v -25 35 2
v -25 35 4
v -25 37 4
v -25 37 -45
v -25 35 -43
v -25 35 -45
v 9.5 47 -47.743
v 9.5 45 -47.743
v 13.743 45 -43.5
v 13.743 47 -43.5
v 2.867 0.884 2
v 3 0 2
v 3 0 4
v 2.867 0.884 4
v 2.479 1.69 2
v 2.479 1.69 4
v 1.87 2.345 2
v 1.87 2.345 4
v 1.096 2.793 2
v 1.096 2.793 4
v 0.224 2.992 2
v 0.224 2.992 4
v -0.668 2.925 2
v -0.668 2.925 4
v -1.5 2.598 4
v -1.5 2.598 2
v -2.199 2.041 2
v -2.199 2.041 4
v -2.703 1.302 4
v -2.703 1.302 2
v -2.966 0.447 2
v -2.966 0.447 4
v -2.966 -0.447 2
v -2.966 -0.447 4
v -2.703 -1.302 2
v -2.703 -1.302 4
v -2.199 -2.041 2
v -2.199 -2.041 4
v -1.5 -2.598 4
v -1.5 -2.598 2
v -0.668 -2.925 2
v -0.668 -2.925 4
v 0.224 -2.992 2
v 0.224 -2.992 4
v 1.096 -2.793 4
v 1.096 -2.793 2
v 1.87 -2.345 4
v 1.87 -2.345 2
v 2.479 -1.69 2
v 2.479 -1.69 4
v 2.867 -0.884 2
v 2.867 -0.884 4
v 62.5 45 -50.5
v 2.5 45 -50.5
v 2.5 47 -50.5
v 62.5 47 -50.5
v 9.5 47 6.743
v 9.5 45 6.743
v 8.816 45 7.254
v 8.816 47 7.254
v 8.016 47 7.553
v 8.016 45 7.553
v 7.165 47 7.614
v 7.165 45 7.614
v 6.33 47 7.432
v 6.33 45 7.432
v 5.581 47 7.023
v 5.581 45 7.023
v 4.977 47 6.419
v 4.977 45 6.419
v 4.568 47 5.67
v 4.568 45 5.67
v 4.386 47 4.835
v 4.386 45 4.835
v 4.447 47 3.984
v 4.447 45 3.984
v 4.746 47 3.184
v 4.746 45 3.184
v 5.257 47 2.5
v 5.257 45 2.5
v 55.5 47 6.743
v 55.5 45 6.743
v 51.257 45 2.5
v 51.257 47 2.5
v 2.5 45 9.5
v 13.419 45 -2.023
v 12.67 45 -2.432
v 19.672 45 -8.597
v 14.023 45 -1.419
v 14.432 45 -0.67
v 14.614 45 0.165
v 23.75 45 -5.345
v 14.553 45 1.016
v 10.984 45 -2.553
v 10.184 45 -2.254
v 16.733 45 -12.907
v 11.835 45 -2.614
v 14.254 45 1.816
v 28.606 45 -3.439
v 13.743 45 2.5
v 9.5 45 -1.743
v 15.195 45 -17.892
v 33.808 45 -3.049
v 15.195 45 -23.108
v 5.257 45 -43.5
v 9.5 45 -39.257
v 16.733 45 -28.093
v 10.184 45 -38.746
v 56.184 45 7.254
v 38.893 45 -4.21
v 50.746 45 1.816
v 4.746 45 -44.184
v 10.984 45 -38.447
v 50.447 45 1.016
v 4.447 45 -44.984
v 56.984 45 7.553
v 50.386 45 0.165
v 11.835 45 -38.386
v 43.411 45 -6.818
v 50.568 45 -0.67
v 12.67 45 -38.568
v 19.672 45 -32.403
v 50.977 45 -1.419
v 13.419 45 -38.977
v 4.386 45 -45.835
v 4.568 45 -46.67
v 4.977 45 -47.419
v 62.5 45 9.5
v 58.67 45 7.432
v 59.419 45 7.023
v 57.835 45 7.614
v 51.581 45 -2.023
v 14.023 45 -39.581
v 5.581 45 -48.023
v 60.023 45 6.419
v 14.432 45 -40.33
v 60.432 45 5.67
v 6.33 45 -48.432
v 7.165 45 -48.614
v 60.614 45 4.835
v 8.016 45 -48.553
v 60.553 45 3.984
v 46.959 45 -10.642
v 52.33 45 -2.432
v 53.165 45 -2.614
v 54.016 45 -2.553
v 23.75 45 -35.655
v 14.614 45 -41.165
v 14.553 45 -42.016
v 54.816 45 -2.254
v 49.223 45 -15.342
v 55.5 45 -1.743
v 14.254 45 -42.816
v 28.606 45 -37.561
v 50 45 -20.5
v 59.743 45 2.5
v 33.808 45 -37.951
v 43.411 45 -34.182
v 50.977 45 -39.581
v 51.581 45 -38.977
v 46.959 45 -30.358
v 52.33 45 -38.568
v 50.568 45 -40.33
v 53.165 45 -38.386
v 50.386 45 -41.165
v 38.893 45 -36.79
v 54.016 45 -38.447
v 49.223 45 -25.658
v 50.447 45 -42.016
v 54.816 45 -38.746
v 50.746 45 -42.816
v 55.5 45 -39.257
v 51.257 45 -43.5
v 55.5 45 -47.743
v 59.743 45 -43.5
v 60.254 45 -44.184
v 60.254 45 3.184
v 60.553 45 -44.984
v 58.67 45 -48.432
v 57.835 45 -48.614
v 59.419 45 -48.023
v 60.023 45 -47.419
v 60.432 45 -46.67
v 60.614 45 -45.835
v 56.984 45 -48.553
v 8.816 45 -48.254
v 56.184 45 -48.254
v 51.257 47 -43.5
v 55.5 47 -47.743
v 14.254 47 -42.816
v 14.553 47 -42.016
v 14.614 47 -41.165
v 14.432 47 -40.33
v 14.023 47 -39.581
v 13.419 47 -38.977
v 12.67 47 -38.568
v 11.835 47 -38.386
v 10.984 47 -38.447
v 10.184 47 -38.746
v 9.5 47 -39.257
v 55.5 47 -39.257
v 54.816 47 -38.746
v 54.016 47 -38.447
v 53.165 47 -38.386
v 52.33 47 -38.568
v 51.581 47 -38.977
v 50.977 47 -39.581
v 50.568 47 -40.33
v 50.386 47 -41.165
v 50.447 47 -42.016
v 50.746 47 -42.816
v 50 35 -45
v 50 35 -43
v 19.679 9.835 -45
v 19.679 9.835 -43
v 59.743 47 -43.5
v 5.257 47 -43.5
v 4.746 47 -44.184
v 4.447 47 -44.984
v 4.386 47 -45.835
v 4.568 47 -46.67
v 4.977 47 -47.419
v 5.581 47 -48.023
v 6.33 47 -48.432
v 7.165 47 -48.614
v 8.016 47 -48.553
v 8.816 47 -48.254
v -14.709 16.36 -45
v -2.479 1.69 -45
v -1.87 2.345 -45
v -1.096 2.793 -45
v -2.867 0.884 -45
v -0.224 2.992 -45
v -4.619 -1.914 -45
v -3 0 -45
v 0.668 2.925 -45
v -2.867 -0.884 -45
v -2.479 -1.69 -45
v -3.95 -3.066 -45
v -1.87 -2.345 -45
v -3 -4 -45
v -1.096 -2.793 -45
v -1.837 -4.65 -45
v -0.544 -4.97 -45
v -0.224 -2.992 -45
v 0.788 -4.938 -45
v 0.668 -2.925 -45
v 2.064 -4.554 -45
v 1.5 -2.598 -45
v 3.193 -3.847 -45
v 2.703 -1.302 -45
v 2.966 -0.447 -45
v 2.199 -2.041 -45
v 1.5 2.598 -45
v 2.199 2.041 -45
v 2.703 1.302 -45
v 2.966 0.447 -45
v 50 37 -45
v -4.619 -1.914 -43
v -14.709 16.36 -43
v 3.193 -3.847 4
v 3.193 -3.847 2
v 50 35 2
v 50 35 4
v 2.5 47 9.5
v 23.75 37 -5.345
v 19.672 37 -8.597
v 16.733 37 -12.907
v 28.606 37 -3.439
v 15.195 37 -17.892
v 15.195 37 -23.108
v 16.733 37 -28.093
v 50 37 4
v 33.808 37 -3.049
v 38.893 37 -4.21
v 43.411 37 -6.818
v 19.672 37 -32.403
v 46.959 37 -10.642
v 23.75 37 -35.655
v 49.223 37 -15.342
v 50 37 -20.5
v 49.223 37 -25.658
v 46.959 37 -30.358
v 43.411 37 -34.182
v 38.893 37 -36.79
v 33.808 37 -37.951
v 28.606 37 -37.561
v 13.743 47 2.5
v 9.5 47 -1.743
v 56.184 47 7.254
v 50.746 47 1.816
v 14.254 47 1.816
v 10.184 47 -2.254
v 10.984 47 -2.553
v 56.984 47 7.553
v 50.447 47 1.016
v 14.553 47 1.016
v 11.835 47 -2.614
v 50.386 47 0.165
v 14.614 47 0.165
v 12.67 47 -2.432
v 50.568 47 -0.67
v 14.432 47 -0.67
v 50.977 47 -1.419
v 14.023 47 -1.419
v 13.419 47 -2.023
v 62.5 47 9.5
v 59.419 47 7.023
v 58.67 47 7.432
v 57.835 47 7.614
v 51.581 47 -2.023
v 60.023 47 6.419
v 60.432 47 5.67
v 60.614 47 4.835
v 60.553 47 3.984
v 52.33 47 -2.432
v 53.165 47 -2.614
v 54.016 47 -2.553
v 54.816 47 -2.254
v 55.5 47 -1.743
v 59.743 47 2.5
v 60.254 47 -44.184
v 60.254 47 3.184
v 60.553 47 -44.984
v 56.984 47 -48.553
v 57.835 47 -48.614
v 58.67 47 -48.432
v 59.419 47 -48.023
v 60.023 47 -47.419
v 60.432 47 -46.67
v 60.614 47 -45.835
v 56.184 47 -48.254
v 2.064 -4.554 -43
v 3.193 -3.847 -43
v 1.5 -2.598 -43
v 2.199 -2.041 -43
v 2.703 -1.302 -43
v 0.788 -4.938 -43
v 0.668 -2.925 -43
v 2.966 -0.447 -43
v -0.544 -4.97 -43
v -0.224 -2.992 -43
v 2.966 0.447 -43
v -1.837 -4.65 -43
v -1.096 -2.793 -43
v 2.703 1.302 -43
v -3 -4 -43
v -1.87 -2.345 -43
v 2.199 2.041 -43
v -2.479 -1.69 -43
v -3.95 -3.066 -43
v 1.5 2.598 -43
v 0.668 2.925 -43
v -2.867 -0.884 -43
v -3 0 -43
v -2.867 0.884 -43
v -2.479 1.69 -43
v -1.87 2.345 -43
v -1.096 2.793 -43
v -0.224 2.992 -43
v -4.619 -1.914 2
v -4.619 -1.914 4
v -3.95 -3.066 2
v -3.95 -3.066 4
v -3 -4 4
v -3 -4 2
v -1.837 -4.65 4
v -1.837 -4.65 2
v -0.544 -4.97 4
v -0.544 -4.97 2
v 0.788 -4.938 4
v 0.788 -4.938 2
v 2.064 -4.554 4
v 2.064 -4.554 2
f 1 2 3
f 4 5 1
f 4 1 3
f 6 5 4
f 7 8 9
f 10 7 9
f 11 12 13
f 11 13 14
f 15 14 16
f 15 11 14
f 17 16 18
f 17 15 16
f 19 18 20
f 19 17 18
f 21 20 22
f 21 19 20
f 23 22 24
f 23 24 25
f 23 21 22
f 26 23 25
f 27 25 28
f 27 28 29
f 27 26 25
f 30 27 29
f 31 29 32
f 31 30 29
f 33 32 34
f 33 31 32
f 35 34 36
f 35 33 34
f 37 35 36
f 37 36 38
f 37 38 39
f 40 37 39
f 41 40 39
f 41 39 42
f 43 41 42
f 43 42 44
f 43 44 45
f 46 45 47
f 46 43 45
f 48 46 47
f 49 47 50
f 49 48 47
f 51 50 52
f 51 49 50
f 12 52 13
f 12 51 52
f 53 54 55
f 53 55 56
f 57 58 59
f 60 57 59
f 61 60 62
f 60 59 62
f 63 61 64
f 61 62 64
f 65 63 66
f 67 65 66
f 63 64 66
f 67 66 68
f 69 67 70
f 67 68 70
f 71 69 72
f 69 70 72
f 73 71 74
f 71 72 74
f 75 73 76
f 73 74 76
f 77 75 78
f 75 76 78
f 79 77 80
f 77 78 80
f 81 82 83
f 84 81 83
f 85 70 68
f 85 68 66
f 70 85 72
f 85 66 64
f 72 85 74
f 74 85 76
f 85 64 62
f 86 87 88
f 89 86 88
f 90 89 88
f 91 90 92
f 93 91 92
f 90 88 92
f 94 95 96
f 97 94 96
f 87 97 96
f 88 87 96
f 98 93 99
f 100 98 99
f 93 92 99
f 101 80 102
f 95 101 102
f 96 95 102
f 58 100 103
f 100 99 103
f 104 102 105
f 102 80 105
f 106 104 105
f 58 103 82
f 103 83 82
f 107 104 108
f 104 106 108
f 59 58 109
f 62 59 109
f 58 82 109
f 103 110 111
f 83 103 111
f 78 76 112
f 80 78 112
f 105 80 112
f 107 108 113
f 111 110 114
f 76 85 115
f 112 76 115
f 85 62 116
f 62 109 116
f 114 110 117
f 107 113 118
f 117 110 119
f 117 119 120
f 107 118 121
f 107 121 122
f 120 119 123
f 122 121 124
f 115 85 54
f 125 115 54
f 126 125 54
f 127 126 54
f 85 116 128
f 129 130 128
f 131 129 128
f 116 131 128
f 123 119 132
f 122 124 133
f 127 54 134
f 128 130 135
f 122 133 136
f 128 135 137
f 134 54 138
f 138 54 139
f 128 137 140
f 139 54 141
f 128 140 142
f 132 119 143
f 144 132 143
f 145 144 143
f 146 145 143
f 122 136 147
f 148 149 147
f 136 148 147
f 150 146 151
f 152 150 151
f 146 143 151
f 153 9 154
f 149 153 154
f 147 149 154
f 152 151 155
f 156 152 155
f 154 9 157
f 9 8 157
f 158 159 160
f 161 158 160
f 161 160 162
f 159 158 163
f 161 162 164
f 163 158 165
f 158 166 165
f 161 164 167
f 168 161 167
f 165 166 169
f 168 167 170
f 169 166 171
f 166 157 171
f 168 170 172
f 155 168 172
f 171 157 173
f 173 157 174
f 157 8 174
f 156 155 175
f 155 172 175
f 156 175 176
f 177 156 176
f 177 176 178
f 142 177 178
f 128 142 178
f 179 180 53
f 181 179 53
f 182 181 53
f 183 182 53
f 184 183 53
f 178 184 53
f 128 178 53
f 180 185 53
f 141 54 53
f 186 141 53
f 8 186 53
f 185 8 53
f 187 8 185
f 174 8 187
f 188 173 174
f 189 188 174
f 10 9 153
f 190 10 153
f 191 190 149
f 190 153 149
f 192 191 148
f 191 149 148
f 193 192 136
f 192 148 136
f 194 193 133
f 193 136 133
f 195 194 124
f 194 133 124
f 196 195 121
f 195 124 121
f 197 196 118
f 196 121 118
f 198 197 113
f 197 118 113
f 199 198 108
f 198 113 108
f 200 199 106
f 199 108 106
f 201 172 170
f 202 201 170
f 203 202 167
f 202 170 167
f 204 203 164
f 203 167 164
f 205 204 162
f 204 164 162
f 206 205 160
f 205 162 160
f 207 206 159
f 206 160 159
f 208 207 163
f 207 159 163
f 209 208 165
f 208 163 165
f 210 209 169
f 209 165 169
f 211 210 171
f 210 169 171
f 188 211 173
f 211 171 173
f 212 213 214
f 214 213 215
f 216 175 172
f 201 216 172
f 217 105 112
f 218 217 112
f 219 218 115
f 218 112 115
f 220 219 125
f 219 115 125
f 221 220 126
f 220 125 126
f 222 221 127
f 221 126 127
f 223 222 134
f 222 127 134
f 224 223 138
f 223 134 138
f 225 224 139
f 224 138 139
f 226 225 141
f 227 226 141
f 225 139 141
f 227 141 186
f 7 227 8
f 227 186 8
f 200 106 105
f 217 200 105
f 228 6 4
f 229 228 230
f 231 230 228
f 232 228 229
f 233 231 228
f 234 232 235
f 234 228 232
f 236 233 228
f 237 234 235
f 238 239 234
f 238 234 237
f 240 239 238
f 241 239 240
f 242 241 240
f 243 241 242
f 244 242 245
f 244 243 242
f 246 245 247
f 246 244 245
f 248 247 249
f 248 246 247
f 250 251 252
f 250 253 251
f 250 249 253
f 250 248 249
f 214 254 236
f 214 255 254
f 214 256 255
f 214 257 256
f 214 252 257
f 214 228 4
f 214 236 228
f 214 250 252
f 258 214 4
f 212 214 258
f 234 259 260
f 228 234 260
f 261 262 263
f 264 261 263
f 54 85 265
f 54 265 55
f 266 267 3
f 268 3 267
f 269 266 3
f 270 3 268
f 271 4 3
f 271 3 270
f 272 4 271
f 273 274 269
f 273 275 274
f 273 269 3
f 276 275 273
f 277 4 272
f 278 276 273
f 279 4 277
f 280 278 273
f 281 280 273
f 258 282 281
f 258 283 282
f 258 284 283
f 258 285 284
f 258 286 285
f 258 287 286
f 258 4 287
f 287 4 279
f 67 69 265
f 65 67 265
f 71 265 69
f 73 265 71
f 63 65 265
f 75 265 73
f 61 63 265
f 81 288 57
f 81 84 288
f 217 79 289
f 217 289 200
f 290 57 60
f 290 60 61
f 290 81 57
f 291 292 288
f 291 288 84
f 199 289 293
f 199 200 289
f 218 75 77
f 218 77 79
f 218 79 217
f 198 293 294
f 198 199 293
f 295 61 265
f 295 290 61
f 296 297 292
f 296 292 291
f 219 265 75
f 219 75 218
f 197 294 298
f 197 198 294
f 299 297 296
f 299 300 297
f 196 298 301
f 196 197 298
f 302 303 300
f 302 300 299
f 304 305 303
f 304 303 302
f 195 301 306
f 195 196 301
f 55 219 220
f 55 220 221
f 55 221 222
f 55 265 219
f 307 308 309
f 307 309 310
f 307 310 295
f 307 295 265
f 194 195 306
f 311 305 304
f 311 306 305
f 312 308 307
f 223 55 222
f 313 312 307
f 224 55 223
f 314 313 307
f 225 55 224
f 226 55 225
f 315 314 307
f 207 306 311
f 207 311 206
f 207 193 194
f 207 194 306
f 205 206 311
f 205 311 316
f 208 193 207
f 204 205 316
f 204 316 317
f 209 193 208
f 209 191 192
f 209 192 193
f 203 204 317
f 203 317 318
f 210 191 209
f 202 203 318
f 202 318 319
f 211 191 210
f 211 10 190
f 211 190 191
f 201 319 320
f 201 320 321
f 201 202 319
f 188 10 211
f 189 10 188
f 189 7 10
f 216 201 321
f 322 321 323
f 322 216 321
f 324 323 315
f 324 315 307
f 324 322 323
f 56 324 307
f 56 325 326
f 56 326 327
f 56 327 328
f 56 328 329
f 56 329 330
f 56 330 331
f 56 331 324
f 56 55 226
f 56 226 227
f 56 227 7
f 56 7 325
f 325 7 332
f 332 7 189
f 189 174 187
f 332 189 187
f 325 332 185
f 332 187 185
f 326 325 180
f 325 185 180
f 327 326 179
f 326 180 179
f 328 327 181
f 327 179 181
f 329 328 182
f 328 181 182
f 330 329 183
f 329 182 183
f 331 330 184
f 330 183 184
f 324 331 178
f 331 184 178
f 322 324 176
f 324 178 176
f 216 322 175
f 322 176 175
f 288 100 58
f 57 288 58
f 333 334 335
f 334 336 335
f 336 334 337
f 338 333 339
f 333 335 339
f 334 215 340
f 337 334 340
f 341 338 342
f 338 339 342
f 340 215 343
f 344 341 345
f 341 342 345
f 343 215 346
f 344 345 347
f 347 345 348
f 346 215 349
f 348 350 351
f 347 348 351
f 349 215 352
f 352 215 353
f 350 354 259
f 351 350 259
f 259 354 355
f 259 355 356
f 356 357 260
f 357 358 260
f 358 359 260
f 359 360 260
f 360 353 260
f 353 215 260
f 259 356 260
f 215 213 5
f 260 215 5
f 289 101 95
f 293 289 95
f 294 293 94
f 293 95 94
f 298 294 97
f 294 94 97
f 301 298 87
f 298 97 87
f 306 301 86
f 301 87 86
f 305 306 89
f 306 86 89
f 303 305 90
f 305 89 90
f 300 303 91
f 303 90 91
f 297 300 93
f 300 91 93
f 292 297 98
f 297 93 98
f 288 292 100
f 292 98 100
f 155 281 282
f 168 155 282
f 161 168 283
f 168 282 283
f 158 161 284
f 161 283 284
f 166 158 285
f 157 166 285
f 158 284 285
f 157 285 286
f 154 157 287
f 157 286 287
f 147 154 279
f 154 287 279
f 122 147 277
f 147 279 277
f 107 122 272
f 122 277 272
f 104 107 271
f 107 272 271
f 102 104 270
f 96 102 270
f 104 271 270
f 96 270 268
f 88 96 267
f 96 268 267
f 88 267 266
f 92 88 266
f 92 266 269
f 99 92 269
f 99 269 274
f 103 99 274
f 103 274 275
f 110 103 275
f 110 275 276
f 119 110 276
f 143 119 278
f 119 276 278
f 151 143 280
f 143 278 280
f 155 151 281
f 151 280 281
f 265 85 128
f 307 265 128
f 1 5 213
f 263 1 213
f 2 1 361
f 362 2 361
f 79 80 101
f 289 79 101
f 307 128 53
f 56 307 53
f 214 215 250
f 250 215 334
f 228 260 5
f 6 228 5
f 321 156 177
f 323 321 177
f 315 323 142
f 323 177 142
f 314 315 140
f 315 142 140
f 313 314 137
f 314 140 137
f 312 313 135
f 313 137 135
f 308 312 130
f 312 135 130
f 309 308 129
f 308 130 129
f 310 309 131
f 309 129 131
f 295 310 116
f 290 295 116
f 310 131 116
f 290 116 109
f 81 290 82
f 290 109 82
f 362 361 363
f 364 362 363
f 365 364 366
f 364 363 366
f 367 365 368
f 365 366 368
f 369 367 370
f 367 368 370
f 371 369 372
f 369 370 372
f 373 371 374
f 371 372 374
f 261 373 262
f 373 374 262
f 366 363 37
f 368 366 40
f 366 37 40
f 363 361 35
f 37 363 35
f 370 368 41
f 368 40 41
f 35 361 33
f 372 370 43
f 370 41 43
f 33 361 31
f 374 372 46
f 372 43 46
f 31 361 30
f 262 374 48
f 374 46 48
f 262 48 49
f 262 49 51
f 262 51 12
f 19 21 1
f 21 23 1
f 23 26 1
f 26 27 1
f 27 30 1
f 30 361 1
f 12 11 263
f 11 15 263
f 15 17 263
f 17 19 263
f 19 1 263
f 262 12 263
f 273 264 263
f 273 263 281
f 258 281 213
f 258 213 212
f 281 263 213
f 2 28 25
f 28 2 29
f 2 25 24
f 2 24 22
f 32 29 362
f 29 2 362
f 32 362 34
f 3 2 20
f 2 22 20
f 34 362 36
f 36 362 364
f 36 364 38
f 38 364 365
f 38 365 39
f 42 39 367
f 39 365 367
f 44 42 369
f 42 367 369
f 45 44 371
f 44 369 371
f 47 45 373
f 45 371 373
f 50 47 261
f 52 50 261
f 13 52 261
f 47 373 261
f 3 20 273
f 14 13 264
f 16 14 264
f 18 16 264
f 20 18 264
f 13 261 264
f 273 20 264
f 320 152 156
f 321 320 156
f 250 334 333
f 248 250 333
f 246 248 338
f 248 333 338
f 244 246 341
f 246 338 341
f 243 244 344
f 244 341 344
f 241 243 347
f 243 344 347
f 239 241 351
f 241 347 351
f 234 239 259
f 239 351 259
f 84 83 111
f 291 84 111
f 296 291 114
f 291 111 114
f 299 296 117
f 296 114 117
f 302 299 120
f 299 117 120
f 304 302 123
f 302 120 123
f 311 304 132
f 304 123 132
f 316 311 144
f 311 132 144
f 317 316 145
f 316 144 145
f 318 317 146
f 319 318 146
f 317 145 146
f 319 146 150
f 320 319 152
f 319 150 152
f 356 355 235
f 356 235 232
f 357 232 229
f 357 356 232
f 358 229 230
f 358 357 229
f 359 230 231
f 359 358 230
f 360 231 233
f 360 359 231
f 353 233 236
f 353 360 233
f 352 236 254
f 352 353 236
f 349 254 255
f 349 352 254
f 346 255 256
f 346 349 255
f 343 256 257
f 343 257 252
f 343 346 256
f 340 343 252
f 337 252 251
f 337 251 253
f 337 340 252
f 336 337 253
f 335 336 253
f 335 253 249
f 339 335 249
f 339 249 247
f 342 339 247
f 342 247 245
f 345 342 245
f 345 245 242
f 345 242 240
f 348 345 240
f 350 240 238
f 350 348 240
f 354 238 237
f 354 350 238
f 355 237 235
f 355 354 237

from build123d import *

# Parameters (mm, degrees)
BOSS_EXTRUDE1_START = 2
SKETCH1_R           = 5
SKETCH1_R_2         = 3
BOSS_EXTRUDE1_DEPTH = 2
BOSS_EXTRUDE2_START = 2
SKETCH2_R           = 3
BOSS_EXTRUDE2_DEPTH = 2
SKETCH3_W           = 75
SKETCH3_H           = 49
BOSS_EXTRUDE3_DEPTH = 2
SKETCH4_R           = 17.5
BOSS_EXTRUDE4_DEPTH = 8
SKETCH5_W           = 60
SKETCH5_H           = 60
BOSS_EXTRUDE5_DEPTH = 2


with BuildPart() as part:
    # Sketch1 → Boss-Extrude1 (new body)
    with BuildSketch(Plane.XY.offset(BOSS_EXTRUDE1_START)):
        with BuildLine():
            Line((50, 35), (-25, 35))
            Line((-25, 35), (-4.619219619, -1.91384694))
            ThreePointArc((-4.619219619, -1.91384694), (-0.975679739, 4.903881019), (5, 0))
            ThreePointArc((5, 0), (4.525827035, -2.125297543), (3.193244142, -3.847491631))
            Line((3.193244142, -3.847491631), (50, 35))
        make_face()
        Circle(SKETCH1_R)
        Circle(SKETCH1_R_2, mode=Mode.SUBTRACT)
    extrude(amount=BOSS_EXTRUDE1_DEPTH)



with BuildPart() as body_2:
    # Sketch2 → Boss-Extrude2 (new body)
    with BuildSketch(Plane(origin=(0, 0, -41), x_dir=(-1, 0, 0), z_dir=(0, 0, -1)).offset(BOSS_EXTRUDE2_START)):
        with BuildLine():
            ThreePointArc((-19.679195809, 9.835103065), (-4.101319052, 21.614328165), (14.708637674, 16.360194919))
            Line((14.708637674, 16.360194919), (25, 35))
            Line((25, 35), (-50, 35))
            Line((-50, 35), (-19.679195809, 9.835103065))
        make_face()
        with BuildLine():
            ThreePointArc((-3.193244142, -3.847491631), (1.201289708, -4.853545409), (4.619219619, -1.91384694))
            Line((4.619219619, -1.91384694), (14.708637674, 16.360194919))
            ThreePointArc((14.708637674, 16.360194919), (-4.101319052, 21.614328165), (-19.679195809, 9.835103065))
            Line((-19.679195809, 9.835103065), (-3.193244142, -3.847491631))
        make_face()
        Circle(SKETCH2_R, mode=Mode.SUBTRACT)
    extrude(amount=BOSS_EXTRUDE2_DEPTH)


with BuildPart() as part_1:
    add(part.part)

    add(body_2.part)  # Boss-Extrude3 merges body 2
    # Sketch3 → Boss-Extrude3 (add)
    with BuildSketch(Plane(origin=(0, 35, 0), x_dir=(1, 0, 0), z_dir=(0, 1, 0))):
        with Locations((12.5, 20.5)):
            Rectangle(SKETCH3_W, SKETCH3_H)
    extrude(amount=BOSS_EXTRUDE3_DEPTH)

    # Sketch4 → Boss-Extrude4 (add)
    with BuildSketch(Plane(origin=(0, 37, 0), x_dir=(1, 0, 0), z_dir=(0, 1, 0))):
        with Locations((32.5, 20.5)):
            Circle(SKETCH4_R)
    extrude(amount=BOSS_EXTRUDE4_DEPTH)

    # Sketch5 → Boss-Extrude5 (add)
    with BuildSketch(Plane(origin=(0, 45, 0), x_dir=(1, 0, 0), z_dir=(0, 1, 0))):
        with Locations((32.5, 20.5)):
            Rectangle(SKETCH5_W, SKETCH5_H)
        with BuildLine():
            Line((9.5, 47.742640687), (13.742640687, 43.5))
            ThreePointArc((13.742640687, 43.5), (13.742640687, 39.257359313), (9.5, 39.257359313))
            Line((9.5, 39.257359313), (5.257359313, 43.5))
            ThreePointArc((5.257359313, 43.5), (5.257359313, 47.742640687), (9.5, 47.742640687))
        make_face(mode=Mode.SUBTRACT)
        with BuildLine():
            Line((59.742640687, 43.5), (55.5, 39.257359313))
            ThreePointArc((55.5, 39.257359313), (51.257359313, 39.257359313), (51.257359313, 43.5))
            Line((51.257359313, 43.5), (55.5, 47.742640687))
            ThreePointArc((55.5, 47.742640687), (59.742640687, 47.742640687), (59.742640687, 43.5))
        make_face(mode=Mode.SUBTRACT)
        with BuildLine():
            Line((55.5, -6.742640687), (51.257359313, -2.5))
            ThreePointArc((51.257359313, -2.5), (51.257359313, 1.742640687), (55.5, 1.742640687))
            Line((55.5, 1.742640687), (59.742640687, -2.5))
            ThreePointArc((59.742640687, -2.5), (59.742640687, -6.742640687), (55.5, -6.742640687))
        make_face(mode=Mode.SUBTRACT)
        with BuildLine():
            Line((5.257359313, -2.5), (9.5, 1.742640687))
            ThreePointArc((9.5, 1.742640687), (13.742640687, 1.742640687), (13.742640687, -2.5))
            Line((13.742640687, -2.5), (9.5, -6.742640687))
            ThreePointArc((9.5, -6.742640687), (5.257359313, -6.742640687), (5.257359313, -2.5))
        make_face(mode=Mode.SUBTRACT)
    extrude(amount=BOSS_EXTRUDE5_DEPTH)


solid = part_1.part
